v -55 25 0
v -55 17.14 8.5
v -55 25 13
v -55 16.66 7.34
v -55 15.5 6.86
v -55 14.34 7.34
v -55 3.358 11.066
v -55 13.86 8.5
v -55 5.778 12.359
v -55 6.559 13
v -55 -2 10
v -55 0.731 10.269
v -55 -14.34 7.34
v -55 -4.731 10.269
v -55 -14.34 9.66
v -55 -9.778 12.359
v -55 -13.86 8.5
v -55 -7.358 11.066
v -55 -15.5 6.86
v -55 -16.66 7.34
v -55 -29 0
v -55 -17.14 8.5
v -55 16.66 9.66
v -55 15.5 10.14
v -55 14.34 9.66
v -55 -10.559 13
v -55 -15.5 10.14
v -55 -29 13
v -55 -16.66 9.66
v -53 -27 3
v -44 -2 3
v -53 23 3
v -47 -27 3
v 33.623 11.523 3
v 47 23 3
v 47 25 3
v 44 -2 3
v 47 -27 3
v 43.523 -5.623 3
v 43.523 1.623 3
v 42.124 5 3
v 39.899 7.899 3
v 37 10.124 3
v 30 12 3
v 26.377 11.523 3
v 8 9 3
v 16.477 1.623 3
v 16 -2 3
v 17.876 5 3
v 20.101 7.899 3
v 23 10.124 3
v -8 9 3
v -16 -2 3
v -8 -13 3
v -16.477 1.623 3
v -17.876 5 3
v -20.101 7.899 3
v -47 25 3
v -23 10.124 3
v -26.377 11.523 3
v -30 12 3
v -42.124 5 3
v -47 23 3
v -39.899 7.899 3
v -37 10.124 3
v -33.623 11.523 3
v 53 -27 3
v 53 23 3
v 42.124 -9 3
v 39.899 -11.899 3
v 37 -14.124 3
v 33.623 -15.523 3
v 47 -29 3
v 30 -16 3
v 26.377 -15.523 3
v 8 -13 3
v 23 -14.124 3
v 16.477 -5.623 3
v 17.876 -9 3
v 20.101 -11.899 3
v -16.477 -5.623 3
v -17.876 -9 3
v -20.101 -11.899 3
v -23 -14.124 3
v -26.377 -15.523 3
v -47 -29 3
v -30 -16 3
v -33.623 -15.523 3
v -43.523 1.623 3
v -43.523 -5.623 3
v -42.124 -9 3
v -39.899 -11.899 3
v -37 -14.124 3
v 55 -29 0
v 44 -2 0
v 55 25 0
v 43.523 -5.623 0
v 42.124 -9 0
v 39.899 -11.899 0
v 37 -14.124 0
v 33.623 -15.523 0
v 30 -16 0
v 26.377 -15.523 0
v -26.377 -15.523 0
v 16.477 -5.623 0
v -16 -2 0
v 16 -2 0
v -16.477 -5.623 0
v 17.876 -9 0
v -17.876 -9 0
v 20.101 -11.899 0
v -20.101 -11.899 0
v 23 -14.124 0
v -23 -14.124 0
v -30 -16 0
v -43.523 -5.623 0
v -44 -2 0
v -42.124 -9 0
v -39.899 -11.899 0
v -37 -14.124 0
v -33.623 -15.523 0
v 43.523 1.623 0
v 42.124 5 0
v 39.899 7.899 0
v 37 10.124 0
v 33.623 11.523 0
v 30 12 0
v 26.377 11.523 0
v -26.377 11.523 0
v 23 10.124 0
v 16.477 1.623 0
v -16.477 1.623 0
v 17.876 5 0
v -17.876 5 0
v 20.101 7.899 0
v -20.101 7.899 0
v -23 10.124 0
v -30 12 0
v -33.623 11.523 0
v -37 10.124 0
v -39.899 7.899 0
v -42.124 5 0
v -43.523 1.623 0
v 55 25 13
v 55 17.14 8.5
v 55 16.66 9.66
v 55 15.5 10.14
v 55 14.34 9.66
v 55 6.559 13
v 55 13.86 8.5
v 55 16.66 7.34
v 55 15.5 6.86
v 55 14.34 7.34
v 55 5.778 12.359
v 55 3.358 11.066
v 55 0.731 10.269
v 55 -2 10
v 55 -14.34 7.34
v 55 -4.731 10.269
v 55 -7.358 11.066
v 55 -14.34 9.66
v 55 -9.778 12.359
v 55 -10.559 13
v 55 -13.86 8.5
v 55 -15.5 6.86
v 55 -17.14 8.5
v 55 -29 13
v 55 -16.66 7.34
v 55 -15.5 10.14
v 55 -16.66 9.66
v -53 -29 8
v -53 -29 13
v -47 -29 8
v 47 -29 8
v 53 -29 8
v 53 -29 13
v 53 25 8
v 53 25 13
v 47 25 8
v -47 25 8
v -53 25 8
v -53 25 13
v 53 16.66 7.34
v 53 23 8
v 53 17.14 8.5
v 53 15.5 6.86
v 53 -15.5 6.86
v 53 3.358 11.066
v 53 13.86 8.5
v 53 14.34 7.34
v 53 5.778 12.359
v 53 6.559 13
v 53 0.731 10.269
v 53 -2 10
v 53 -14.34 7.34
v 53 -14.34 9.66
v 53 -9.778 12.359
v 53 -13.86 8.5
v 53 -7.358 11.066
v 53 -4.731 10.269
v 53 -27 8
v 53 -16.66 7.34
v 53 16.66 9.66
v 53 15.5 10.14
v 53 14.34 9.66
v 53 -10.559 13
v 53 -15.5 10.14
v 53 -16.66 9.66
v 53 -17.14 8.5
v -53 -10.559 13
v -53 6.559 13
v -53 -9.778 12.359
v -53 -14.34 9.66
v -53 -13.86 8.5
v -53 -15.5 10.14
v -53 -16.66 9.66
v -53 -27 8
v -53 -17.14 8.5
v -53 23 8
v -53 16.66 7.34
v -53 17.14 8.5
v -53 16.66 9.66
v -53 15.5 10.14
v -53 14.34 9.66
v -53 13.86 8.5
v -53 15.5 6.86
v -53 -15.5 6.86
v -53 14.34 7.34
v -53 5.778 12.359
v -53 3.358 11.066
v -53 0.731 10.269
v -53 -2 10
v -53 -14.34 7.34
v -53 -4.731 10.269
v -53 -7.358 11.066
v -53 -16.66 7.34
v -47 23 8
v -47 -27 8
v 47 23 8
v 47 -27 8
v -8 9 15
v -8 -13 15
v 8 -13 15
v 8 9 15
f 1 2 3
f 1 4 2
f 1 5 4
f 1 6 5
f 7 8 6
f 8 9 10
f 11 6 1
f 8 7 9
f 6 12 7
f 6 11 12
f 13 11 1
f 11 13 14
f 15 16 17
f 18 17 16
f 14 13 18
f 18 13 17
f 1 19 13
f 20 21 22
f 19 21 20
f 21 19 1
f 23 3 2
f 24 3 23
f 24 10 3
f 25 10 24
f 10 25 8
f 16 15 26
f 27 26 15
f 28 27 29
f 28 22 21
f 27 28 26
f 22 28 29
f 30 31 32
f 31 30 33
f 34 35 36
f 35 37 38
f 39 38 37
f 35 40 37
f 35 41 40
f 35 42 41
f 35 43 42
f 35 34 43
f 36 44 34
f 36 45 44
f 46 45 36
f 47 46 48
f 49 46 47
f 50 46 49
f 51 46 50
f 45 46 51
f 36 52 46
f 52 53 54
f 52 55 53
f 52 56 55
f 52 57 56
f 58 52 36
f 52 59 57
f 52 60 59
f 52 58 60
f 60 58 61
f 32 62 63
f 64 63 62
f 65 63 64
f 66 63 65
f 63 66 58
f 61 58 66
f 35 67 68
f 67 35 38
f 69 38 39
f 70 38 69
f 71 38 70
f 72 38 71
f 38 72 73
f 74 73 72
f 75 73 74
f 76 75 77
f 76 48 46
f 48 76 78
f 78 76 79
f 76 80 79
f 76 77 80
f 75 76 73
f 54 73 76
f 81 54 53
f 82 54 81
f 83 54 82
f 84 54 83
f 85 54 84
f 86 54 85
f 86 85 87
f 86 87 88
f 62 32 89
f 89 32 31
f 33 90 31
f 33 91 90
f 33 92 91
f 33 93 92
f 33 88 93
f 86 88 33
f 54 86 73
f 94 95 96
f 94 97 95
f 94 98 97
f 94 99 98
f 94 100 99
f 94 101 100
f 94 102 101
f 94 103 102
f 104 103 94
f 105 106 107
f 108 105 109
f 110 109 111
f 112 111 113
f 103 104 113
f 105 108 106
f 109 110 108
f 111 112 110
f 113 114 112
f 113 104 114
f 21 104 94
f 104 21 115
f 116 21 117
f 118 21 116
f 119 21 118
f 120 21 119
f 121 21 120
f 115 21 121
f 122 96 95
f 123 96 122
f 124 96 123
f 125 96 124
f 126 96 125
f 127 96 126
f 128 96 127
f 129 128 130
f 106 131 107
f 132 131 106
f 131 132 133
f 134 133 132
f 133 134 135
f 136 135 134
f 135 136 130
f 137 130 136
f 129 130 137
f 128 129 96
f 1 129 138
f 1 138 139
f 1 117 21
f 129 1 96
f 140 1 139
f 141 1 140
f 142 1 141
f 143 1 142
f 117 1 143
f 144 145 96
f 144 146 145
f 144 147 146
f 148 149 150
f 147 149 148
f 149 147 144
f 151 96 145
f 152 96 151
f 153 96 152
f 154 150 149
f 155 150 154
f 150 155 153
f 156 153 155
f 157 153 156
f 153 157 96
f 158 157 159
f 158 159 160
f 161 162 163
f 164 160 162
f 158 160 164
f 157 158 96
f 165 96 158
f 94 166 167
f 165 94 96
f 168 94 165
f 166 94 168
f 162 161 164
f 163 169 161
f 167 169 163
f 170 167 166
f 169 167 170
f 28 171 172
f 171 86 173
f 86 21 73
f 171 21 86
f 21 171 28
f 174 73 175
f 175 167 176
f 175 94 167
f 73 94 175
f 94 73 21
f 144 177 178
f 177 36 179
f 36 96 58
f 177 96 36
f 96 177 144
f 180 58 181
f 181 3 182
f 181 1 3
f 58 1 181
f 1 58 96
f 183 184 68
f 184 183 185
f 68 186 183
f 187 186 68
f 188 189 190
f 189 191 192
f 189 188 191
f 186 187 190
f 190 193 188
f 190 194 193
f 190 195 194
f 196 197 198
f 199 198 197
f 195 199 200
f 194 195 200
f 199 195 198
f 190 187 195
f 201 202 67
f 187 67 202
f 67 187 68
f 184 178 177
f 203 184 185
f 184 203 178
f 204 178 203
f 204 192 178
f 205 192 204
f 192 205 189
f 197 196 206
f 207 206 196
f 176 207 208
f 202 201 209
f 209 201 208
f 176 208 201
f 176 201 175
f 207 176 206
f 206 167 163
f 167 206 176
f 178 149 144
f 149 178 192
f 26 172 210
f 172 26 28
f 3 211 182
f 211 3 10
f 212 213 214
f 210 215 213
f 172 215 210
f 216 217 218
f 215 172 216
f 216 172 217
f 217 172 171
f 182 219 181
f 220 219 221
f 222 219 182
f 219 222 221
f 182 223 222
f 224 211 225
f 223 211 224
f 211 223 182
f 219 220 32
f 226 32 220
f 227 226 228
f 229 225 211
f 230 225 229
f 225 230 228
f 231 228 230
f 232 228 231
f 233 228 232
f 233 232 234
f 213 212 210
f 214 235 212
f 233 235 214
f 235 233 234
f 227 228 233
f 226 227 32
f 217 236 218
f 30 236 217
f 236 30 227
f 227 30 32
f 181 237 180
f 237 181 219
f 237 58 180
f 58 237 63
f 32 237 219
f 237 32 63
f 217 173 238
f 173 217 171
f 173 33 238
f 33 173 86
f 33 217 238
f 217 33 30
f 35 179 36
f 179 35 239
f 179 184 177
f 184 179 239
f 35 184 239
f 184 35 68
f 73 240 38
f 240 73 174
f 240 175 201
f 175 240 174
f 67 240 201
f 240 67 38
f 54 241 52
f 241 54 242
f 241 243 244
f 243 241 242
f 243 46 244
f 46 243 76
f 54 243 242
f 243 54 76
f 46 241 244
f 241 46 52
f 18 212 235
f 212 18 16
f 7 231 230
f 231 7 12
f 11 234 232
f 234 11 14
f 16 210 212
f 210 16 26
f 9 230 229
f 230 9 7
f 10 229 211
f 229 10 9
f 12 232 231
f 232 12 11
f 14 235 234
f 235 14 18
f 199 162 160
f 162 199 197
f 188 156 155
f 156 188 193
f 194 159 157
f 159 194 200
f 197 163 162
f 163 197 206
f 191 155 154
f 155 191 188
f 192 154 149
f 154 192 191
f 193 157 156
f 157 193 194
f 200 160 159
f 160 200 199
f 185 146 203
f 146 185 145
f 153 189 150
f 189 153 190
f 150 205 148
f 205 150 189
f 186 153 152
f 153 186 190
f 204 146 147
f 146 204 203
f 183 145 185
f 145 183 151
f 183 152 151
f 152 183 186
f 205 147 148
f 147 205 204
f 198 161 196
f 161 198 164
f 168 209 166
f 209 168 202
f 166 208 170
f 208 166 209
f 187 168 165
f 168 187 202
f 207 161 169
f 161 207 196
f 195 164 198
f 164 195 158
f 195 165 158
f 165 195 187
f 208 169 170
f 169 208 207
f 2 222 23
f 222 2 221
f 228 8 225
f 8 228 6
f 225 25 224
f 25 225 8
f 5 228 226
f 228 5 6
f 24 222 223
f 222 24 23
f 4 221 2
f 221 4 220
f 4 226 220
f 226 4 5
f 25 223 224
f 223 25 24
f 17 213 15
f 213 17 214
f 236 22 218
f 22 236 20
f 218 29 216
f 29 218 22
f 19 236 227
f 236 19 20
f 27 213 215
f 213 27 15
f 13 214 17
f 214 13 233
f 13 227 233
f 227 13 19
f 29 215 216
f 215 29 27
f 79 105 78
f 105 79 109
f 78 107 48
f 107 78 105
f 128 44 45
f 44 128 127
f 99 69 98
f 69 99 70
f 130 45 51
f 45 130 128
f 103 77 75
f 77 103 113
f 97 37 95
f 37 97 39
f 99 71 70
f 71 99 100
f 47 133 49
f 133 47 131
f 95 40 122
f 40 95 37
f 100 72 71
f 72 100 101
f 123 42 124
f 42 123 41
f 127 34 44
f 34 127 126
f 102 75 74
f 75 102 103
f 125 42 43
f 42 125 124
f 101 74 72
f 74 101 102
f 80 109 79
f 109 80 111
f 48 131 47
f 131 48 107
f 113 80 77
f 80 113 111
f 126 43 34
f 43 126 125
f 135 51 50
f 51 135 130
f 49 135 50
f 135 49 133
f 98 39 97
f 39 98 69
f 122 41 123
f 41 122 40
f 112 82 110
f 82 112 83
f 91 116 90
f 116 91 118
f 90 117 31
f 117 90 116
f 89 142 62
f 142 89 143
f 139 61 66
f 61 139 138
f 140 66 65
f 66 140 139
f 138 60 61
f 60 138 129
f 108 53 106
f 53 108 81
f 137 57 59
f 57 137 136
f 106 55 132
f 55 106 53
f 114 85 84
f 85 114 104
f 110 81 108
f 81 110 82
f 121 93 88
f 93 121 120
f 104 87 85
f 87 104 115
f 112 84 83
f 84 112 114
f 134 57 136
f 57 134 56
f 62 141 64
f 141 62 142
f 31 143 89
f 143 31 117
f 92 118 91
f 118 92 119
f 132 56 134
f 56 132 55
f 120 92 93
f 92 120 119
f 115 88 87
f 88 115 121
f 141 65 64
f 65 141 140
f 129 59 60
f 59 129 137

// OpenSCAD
// B_ROBOT
// Arduino 3D printed Self Balancig Robot project
// Author: Jose Julio


height = 140;
length = 106;//original design is 102, add 20mm to fit in the Due and Cubieboard
width = 54;//default is 50, cubieboard middle plate is 60, Due is 54
m3NutsHeight = 3.2;
xAdjOnM3Nut = 0.4;
yAdjOnM3 = (width-50)/2;
//bottom plate
module u_plate_base()
{
	translate([-(length+4)/2,0,0]) cube([length+4,width,3]);
	translate([-(length+4)/2,0,0]) cube([2,width,3+10]);
	translate([(length+4)/2-2,0,0]) cube([2,width,3+10]);

	translate([(length+4)/2-8,0,0]) cube([8,2,8]);
	translate([(length+4)/2-8,width-2,0]) cube([8,2,8]);
	translate([-(length+4)/2,0,0]) cube([8,2,8]);
	translate([-(length+4)/2,width-2,0]) cube([8,2,8]);

	translate([-8,(width/2)-11,0]) cube([16,22,15]);
	
}

module u_plate1_holes()
{
	// Motor shaft hole
	translate([length/2,width/2,24]) rotate([0,90,0]) cylinder(r=14,h=10,$fn=32,center=true);
	translate([-length/2,width/2,24]) rotate([0,90,0]) cylinder(r=14,h=10,$fn=32,center=true);

	// Motor mount holes
	translate([-(length+4)/2,9.5,5.5+3]) rotate([0,90,0]) cylinder(r=1.64,h=10,$fn=8,center=true);
	translate([-(length+4)/2,9.5+31,5.5+3]) rotate([0,90,0]) cylinder(r=1.64,h=10,$fn=8,center=true);
	translate([(length+4)/2,9.5,5.5+3]) rotate([0,90,0]) cylinder(r=1.64,h=10,$fn=8,center=true);
	translate([(length+4)/2,9.5+31,5.5+3]) rotate([0,90,0]) cylinder(r=1.64,h=10,$fn=8,center=true);

	//translate([0,width/2,0]) cylinder(r=12,h=10,$fn=24,center=true);
	translate([-30,width/2,0]) cylinder(r=14,h=10,$fn=24,center=true);
	translate([30,width/2,0]) cylinder(r=14,h=10,$fn=24,center=true);	
}

//the bottom plate
translate([0,0,5]) rotate ([180,-180,0]) difference()

translate([0,-25,-5]) difference()//set the y translate to -25 when exporting stl
{
	u_plate_base();
	u_plate1_holes();
}
